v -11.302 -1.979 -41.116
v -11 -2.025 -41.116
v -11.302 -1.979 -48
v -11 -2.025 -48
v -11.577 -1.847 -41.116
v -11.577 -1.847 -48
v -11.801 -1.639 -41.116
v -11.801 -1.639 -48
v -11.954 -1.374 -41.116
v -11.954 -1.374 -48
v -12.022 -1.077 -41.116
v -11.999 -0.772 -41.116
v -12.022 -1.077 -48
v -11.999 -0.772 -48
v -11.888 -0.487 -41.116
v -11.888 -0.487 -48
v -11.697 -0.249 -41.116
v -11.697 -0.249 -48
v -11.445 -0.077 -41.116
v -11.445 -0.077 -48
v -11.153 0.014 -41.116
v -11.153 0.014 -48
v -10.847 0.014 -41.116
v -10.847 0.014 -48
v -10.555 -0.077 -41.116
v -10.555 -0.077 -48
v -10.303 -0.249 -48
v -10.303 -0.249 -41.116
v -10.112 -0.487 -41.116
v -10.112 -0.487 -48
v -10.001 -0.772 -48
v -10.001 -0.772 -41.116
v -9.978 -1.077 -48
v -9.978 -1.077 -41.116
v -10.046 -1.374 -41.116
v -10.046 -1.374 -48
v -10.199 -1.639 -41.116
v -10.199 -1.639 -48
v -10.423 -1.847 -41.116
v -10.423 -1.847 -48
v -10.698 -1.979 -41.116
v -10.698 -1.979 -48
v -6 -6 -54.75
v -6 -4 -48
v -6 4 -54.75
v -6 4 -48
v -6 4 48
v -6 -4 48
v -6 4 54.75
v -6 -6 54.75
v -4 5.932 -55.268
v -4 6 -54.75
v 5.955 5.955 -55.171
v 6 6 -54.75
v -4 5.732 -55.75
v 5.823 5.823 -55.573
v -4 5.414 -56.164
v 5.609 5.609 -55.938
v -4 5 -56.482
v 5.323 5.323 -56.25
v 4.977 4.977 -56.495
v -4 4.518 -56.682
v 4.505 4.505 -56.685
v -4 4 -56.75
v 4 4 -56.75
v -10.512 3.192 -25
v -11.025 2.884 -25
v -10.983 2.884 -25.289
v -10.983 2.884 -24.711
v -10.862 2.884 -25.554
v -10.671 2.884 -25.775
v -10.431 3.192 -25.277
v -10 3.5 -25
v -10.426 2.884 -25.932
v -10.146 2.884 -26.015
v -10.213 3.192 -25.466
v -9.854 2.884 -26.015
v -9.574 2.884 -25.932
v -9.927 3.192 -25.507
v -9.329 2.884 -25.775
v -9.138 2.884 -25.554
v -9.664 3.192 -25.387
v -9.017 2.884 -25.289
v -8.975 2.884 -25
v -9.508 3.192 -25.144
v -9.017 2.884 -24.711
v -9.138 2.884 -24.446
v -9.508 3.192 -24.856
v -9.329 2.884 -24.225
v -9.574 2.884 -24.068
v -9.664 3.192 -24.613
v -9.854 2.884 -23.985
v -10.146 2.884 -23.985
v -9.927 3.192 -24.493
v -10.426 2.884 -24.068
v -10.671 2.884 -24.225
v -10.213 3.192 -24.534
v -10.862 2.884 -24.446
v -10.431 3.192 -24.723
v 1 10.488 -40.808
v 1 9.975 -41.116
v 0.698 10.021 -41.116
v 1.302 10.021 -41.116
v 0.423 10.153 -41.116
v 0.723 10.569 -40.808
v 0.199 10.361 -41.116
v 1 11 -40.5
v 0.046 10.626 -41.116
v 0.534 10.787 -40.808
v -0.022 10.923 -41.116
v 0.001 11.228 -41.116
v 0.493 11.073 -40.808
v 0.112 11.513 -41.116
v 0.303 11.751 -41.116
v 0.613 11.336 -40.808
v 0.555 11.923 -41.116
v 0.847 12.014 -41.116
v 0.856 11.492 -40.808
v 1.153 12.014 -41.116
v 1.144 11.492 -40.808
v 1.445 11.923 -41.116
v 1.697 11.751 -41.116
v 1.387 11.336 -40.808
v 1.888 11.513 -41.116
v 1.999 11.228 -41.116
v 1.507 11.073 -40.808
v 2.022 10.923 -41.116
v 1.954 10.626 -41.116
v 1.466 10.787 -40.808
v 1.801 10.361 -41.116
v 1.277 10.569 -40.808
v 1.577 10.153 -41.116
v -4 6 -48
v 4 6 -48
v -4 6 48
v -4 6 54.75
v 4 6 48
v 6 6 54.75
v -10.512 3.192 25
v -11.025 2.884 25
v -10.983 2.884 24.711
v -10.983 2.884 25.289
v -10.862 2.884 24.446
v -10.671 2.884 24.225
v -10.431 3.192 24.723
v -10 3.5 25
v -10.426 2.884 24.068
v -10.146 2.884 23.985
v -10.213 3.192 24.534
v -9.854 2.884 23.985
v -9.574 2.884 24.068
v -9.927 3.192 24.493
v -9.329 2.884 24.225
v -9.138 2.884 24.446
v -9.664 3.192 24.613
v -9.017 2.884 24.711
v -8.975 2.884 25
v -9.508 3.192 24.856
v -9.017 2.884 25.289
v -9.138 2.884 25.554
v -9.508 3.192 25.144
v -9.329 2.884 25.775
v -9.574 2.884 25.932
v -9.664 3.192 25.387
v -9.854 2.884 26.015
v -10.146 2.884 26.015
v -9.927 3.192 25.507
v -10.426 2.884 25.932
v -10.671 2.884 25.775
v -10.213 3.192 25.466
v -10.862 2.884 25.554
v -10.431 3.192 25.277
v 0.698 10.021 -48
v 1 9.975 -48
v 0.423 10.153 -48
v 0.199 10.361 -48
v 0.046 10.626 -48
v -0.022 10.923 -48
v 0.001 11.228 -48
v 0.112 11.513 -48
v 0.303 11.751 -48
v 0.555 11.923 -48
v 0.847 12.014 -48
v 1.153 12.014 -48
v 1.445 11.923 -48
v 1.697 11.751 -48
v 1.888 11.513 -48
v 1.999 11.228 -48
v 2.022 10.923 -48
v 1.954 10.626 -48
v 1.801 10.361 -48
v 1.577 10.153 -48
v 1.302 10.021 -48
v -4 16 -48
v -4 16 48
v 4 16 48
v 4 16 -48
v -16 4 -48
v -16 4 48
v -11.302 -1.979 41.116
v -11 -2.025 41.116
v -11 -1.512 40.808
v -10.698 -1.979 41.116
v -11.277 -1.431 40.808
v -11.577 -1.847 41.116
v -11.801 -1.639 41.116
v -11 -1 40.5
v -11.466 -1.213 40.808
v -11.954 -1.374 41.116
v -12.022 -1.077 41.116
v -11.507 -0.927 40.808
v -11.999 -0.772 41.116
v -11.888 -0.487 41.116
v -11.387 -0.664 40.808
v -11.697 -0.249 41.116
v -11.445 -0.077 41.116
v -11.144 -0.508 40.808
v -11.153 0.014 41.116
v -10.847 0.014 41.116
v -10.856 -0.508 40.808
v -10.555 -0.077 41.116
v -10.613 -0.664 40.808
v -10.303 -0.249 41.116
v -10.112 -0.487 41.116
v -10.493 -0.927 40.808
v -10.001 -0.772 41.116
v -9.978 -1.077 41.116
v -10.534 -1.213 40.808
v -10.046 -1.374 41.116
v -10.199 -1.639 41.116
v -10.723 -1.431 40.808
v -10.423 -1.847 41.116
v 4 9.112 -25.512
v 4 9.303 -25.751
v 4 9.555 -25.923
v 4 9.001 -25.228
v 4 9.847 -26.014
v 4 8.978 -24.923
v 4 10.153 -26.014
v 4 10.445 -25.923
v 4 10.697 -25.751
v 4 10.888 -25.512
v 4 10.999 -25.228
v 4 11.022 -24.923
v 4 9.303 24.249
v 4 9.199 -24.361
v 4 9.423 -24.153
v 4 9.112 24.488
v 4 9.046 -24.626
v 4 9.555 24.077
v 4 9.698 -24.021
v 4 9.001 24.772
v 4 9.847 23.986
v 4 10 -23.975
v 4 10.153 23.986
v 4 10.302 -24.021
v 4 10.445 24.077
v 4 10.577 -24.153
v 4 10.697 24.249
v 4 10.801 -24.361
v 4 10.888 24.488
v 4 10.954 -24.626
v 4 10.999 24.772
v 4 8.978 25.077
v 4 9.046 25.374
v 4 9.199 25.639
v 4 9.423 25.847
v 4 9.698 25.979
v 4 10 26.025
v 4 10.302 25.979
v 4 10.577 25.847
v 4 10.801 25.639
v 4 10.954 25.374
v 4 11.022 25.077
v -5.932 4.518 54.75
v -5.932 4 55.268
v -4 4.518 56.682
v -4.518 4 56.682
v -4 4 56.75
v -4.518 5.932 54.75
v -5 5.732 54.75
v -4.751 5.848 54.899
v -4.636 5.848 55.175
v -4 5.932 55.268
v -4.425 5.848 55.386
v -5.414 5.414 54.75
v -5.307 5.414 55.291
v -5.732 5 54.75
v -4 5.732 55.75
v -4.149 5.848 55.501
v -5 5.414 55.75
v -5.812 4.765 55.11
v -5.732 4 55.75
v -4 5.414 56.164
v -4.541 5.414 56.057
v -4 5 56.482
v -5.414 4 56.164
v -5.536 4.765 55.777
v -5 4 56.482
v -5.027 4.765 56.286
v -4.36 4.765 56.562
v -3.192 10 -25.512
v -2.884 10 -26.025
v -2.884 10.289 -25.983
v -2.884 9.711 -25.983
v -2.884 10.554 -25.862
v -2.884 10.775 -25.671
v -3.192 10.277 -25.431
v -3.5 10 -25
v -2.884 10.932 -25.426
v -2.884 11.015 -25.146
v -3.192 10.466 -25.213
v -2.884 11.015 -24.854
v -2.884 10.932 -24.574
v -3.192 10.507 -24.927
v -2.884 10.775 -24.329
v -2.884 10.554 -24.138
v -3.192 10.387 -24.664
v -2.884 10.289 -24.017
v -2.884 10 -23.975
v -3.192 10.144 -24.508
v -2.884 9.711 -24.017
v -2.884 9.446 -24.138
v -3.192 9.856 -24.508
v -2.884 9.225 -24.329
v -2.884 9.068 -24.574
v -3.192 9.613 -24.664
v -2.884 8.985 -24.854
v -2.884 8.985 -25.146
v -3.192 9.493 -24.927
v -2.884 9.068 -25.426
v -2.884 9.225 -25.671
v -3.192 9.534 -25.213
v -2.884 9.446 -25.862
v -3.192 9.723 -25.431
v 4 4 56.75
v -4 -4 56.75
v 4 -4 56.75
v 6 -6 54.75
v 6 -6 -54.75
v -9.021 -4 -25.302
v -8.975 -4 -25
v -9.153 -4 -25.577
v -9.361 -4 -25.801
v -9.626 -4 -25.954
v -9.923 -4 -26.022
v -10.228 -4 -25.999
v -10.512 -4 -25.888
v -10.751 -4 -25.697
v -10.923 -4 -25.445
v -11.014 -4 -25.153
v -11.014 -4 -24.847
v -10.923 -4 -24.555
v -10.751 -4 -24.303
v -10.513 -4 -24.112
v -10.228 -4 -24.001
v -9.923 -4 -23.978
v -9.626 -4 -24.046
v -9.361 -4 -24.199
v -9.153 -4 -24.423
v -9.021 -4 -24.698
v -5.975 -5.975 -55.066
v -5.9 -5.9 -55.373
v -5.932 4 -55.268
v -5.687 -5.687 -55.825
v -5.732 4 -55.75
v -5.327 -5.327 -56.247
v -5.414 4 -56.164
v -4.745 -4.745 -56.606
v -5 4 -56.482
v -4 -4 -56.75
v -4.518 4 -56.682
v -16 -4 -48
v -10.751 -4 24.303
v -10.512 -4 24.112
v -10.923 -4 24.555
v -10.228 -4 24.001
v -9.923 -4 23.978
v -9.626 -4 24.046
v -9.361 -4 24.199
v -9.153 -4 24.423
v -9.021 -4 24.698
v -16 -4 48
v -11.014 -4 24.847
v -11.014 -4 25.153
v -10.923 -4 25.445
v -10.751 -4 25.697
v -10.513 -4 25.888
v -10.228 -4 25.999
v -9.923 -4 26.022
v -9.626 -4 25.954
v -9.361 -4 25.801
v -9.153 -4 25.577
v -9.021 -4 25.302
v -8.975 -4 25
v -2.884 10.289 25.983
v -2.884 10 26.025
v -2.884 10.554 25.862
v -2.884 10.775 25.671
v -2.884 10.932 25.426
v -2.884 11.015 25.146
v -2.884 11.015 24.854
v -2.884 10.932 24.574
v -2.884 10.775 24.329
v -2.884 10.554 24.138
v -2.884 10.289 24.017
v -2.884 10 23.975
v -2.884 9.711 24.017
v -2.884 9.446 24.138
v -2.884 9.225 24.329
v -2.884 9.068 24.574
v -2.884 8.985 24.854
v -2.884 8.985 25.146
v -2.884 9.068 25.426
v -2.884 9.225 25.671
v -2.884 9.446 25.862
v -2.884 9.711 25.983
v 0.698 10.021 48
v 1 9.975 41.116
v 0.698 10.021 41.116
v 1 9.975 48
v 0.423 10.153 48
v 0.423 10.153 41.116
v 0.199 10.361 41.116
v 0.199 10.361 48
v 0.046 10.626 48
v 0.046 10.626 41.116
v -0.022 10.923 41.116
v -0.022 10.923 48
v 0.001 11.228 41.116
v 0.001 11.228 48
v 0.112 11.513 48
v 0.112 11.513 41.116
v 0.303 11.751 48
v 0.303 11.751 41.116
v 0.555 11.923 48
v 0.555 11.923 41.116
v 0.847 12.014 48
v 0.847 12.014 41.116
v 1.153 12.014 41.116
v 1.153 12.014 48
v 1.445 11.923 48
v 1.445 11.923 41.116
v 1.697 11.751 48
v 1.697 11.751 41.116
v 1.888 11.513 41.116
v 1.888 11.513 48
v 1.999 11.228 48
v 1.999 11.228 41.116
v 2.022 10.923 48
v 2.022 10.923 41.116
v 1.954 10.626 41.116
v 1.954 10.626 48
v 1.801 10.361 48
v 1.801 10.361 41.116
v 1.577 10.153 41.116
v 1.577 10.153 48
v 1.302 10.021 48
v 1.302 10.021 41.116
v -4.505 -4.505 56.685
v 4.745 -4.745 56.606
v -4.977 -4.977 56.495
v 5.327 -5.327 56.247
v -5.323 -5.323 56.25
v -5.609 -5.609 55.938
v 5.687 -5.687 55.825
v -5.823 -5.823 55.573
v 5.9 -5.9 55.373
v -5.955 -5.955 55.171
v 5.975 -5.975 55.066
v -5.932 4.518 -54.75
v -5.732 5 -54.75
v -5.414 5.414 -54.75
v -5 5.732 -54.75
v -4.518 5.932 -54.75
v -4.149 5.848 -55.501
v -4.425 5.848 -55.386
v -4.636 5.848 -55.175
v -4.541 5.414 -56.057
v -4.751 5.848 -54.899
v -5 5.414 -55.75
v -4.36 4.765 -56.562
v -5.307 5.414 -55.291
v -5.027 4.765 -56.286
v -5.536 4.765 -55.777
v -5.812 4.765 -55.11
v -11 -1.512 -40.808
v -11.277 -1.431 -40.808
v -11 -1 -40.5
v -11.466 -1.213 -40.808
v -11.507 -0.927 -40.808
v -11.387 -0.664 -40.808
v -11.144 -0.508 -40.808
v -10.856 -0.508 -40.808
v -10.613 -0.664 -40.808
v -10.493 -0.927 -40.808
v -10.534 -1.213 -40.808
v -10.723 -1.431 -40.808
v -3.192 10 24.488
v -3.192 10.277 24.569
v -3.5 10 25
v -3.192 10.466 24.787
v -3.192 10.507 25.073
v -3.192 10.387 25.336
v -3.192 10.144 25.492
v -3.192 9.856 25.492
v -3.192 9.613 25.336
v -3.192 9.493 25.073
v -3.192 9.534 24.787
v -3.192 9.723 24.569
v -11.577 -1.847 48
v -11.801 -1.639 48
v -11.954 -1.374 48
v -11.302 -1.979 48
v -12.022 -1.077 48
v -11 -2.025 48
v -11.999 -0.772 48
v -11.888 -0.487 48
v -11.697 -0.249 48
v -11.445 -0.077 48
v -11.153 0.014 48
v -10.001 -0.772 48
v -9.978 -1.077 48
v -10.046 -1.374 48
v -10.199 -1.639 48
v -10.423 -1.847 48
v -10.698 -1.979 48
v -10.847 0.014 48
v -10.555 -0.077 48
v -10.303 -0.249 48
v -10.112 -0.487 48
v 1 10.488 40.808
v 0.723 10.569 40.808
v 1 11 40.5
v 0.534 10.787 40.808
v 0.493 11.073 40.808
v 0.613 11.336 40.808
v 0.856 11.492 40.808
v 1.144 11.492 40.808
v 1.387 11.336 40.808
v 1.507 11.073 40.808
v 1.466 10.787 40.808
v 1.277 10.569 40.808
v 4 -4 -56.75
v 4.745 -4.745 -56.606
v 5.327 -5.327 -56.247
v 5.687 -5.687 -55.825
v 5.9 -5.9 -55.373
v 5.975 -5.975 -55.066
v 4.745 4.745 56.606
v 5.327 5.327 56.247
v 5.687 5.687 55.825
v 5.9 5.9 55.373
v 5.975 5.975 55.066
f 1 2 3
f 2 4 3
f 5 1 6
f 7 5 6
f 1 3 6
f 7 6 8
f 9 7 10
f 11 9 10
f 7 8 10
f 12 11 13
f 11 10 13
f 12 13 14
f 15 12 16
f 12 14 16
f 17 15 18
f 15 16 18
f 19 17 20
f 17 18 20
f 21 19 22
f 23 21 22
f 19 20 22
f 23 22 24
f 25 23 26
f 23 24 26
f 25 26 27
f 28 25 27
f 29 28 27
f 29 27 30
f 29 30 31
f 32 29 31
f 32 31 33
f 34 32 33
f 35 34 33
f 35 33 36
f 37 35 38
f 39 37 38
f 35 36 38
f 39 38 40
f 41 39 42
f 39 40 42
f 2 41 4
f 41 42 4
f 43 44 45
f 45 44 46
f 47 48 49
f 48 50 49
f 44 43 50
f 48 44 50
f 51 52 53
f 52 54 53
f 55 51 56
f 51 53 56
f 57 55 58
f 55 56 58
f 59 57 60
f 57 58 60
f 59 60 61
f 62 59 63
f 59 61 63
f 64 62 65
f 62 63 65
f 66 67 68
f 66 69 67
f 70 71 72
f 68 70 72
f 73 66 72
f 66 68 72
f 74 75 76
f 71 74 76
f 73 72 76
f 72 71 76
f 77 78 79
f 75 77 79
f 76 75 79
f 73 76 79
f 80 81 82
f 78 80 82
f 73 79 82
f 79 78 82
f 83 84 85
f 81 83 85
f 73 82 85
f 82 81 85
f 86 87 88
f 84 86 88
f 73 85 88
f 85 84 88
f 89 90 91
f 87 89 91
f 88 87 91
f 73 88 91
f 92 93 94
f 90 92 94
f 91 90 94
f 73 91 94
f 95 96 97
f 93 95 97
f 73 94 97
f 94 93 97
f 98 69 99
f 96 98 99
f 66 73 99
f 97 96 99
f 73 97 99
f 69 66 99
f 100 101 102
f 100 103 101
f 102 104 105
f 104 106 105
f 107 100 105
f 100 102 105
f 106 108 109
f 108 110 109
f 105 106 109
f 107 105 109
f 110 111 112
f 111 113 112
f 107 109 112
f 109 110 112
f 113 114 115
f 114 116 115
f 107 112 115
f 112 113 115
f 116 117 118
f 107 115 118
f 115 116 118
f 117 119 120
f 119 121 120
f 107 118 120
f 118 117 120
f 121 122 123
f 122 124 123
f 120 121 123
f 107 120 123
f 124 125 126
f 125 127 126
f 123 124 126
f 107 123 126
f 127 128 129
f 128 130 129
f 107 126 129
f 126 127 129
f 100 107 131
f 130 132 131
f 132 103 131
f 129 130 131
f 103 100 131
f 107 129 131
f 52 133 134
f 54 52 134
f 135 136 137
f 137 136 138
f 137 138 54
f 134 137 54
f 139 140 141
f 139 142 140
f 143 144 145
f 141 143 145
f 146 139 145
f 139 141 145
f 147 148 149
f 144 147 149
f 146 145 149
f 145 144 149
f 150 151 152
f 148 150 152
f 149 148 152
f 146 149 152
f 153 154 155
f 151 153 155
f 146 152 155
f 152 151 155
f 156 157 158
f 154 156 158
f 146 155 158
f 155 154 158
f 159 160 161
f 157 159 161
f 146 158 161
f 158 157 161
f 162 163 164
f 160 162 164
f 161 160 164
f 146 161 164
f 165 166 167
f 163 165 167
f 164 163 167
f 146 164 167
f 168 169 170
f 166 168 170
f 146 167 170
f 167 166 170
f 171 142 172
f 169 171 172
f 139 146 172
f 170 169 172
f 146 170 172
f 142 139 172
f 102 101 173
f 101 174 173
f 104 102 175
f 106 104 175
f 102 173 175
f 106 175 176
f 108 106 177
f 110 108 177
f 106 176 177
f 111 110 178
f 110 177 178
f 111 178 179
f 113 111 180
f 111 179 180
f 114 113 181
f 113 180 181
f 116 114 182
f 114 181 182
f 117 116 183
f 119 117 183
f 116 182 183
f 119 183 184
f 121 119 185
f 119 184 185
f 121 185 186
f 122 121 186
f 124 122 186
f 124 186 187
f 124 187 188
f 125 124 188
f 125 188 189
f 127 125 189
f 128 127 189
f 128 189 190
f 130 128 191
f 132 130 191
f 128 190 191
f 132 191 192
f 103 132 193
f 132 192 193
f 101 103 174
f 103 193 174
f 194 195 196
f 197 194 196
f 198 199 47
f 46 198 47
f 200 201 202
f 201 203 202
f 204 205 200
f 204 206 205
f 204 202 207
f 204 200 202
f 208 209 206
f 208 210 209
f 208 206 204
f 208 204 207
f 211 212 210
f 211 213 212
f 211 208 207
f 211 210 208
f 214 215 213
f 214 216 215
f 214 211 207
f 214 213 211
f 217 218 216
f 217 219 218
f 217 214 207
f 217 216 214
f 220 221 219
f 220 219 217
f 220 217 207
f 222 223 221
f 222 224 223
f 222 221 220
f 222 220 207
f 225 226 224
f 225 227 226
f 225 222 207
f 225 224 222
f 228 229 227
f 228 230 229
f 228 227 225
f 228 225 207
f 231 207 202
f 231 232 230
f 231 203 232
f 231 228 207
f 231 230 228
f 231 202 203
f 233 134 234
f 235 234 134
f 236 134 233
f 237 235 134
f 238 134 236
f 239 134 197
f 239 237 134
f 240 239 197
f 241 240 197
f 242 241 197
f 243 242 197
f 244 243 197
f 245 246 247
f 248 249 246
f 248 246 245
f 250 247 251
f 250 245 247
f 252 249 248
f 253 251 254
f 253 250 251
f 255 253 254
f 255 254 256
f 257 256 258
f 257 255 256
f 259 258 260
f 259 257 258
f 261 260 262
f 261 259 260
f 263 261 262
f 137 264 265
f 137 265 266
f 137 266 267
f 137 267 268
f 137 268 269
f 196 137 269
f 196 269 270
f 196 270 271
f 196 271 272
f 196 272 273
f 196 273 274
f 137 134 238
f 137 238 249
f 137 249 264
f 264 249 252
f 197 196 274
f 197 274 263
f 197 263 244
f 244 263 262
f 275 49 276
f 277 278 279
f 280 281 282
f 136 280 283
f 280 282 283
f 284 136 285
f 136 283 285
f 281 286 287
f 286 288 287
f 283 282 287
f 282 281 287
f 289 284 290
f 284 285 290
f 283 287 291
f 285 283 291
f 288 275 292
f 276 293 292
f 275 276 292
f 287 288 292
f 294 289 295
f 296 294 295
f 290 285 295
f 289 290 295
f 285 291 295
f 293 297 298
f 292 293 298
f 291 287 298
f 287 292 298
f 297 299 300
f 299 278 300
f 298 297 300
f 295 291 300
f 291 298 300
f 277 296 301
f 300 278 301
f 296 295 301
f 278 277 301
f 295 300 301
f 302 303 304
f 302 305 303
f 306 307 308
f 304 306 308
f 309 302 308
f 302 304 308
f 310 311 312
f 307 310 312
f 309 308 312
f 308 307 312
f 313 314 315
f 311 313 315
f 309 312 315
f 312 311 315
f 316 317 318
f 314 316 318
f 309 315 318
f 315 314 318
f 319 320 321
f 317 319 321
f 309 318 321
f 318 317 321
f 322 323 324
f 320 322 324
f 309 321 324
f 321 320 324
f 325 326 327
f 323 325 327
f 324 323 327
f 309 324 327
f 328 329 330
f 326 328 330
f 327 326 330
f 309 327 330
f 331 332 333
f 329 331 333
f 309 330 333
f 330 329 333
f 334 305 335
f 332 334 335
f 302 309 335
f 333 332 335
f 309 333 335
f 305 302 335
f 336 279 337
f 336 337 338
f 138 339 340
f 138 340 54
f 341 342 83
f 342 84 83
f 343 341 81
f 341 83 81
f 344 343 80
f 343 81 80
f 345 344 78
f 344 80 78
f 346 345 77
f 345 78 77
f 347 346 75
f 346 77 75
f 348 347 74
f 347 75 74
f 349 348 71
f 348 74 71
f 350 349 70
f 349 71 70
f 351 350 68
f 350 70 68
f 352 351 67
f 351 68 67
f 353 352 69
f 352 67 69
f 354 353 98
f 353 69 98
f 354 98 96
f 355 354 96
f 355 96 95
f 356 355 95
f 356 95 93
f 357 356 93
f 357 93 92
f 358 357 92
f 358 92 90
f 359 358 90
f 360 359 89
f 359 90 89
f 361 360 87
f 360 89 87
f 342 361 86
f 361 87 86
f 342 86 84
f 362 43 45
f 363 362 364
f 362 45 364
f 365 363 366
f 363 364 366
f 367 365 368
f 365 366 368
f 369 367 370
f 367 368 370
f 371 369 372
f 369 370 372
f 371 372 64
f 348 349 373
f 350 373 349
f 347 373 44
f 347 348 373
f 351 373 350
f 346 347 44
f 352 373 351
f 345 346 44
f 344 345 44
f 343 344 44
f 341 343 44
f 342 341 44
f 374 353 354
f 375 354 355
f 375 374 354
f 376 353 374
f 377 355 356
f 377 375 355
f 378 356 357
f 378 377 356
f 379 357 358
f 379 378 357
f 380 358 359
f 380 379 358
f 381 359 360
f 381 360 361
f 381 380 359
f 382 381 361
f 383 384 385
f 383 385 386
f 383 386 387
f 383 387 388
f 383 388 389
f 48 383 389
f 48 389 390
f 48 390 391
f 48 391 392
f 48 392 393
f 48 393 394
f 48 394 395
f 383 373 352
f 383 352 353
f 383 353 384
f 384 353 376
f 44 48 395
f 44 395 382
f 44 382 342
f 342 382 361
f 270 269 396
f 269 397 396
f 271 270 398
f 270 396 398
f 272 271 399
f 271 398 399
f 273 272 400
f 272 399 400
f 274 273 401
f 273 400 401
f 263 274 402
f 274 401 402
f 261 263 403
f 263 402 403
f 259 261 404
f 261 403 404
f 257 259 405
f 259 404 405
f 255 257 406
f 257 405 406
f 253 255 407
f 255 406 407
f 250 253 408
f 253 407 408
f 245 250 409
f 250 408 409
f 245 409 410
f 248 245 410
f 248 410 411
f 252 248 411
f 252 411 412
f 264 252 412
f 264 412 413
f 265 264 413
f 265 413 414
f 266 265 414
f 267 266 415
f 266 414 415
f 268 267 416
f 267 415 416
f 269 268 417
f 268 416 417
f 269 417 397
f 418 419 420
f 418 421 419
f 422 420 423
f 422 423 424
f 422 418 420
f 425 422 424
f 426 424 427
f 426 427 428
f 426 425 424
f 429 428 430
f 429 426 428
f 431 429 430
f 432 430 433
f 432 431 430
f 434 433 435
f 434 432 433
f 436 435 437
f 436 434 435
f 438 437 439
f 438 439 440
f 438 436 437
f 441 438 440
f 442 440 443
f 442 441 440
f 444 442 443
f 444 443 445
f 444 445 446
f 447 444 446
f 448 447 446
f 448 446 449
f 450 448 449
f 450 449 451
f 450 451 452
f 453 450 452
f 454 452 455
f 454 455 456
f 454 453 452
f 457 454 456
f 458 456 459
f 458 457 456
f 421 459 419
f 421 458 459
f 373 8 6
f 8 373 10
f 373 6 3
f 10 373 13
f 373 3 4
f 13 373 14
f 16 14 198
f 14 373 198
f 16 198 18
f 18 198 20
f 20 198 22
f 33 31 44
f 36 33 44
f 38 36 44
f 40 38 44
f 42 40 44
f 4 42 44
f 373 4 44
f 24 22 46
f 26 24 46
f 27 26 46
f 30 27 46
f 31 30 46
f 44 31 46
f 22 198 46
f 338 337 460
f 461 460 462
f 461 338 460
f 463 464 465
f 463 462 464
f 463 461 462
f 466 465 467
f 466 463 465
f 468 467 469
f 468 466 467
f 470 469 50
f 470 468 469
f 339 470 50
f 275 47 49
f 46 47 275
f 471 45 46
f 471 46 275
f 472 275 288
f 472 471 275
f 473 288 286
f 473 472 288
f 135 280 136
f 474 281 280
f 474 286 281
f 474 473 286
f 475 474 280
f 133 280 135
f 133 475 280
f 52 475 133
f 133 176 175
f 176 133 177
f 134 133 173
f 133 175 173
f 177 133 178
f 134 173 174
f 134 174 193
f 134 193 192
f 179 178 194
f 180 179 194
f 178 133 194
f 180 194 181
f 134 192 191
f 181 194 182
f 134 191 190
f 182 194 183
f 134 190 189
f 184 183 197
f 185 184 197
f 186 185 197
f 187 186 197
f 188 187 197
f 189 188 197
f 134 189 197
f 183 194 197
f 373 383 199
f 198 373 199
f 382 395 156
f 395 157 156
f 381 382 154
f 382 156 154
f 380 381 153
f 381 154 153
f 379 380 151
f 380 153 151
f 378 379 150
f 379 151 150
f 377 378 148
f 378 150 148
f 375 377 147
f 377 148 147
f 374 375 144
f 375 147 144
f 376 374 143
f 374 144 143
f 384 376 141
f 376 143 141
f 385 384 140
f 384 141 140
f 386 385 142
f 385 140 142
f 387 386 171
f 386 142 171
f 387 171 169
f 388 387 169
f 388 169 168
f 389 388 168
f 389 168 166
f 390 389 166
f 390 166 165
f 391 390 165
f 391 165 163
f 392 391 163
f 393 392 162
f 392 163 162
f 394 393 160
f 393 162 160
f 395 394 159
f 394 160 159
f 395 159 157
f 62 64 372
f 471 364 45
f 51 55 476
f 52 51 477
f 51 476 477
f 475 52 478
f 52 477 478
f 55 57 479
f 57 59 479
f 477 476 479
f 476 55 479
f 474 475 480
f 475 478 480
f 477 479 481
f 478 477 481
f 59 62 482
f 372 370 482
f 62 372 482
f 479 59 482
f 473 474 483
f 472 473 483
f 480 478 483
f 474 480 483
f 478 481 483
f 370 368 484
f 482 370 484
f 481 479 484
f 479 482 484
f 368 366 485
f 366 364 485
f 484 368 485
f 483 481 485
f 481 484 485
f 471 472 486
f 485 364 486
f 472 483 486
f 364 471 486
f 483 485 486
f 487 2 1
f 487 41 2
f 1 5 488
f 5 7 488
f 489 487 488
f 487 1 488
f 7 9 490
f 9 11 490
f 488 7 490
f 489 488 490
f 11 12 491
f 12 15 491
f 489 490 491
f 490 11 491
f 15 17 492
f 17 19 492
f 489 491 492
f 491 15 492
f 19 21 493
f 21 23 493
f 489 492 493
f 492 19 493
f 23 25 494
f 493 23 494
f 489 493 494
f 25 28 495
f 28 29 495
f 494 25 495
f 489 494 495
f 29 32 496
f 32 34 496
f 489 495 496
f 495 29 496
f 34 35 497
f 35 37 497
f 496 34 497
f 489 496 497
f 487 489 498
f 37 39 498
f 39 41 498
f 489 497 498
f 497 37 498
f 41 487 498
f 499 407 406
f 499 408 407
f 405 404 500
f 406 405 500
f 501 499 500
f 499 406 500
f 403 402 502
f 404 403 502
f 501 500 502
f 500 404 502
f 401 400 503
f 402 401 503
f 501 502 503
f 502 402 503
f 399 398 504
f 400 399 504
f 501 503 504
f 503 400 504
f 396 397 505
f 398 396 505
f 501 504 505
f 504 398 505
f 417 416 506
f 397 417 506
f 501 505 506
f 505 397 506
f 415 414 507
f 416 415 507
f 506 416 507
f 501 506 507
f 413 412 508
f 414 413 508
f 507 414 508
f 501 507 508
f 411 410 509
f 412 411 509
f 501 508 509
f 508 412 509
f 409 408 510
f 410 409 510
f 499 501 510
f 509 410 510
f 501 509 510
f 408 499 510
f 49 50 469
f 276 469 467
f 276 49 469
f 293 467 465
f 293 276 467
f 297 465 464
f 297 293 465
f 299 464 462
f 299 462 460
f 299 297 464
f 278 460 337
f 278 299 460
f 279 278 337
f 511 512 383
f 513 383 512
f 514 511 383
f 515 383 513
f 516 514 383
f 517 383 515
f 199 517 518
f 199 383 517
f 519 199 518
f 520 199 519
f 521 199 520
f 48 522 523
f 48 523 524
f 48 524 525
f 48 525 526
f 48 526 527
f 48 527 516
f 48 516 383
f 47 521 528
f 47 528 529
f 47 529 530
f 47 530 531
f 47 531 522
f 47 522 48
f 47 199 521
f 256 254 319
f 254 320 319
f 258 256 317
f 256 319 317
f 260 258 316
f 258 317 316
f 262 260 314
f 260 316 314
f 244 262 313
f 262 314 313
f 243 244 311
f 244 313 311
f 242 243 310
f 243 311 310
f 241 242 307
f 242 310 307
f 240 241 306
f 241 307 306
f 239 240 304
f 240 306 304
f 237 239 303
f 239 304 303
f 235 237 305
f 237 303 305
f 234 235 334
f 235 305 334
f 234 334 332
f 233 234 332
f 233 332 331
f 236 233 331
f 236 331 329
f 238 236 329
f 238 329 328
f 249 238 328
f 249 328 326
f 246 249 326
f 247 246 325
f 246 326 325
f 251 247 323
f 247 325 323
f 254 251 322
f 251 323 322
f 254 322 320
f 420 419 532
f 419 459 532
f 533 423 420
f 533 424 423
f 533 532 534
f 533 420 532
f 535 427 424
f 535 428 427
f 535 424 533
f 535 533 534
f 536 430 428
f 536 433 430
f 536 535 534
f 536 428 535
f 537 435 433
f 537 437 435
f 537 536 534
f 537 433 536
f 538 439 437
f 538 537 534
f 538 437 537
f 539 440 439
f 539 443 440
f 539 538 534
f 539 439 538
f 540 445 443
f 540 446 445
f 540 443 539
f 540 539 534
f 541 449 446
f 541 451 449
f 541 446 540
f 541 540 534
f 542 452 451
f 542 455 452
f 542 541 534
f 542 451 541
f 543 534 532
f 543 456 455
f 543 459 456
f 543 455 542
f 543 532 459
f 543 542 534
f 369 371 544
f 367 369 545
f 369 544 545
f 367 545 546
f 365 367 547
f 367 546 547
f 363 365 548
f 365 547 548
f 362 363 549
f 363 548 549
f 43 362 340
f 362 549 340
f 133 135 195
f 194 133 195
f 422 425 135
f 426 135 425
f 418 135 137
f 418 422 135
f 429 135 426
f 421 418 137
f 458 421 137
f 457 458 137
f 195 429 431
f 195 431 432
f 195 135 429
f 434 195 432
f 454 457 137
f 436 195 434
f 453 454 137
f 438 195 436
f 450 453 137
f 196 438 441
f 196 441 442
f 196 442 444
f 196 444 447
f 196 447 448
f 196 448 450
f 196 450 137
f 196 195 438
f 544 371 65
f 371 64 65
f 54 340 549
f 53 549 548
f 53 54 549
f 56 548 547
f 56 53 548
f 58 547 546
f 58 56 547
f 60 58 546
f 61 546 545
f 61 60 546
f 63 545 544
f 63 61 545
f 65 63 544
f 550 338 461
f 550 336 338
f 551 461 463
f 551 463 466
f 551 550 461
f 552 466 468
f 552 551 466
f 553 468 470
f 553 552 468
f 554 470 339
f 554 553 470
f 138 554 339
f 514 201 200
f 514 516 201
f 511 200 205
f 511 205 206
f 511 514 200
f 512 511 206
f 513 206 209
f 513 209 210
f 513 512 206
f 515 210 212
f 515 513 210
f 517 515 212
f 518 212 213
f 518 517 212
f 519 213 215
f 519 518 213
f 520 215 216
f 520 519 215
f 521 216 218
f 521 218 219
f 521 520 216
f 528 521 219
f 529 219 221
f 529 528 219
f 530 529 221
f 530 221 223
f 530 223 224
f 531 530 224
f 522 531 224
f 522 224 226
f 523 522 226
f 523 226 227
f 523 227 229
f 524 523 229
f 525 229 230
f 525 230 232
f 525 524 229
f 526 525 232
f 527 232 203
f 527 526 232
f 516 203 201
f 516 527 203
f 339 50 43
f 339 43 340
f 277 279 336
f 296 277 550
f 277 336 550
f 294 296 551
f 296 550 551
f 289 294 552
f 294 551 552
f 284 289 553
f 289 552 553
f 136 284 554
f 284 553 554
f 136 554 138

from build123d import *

# Parameters (mm, degrees)
SCHIZZO1_W                   = 12
SCHIZZO1_H                   = 12
ESTRUSIONE_ESTRUSIONE1_DEPTH = 56.75
RACCORDO1_R                  = 2
ESTRUSIONE_ESTRUSIONE3_START = -8.75
SCHIZZO3_W                   = 8
SCHIZZO3_H                   = 10
SCHIZZO3_W_2                 = 10
SCHIZZO3_H_2                 = 8
ESTRUSIONE_ESTRUSIONE3_DEPTH = 96
FORO_FILETTATO_M2_5_3_D      = 2.05
FORO_FILETTATO_M2_5_3_DEPTH  = 6.884117865
FORO_FILETTATO_M2_5_3_TIP    = 0.615882135
FORO_FILETTATO_M2_5_4_D      = 2.05
FORO_FILETTATO_M2_5_4_DEPTH  = 6.884117865
FORO_FILETTATO_M2_5_4_TIP    = 0.615882135


with BuildPart() as part:
    # Schizzo1 → Estrusione-Estrusione1 (new, symmetric)
    with BuildSketch(Plane.XY):
        Rectangle(SCHIZZO1_W, SCHIZZO1_H)
    extrude(amount=ESTRUSIONE_ESTRUSIONE1_DEPTH, both=True)

    # Raccordo1
    raccordo1_edges = [part.edges().sort_by_distance(p)[0] for p in [
        (-6, 0, 56.75),
        (0, -6, 56.75),
        (6, 0, 56.75),
        (0, -6, -56.75),
        (-6, 0, -56.75),
        (0, 6, -56.75),
        (6, 0, -56.75),
        (-6, 6, 0),
        (0, 6, 56.75),
    ]]
    fillet(raccordo1_edges, radius=RACCORDO1_R)

    # Schizzo3 → Estrusione-Estrusione3 (add)
    with BuildSketch(Plane.XY.offset(56.75).offset(ESTRUSIONE_ESTRUSIONE3_START)):
        with Locations((0, 11)):
            Rectangle(SCHIZZO3_W, SCHIZZO3_H)
        with Locations((-11, 0)):
            Rectangle(SCHIZZO3_W_2, SCHIZZO3_H_2)
    extrude(amount=-ESTRUSIONE_ESTRUSIONE3_DEPTH)

    # Schizzo5 → Foro filettato M2.5-1 (revolve, cut)
    with BuildSketch(Plane(origin=(1, 11, 48), x_dir=(0, -1, 0), z_dir=(1, 0, 0))):
        Polygon((0, 0), (0, 7.5), (1.025, 6.884117865), (1.025, 0), align=None)
    foro_filettato_m2_5_1 = revolve(axis=Axis((1, 11, 54.35), (0, 0, -1)), mode=Mode.SUBTRACT)

    # Schizzo8 → Foro filettato M2.5-2 (revolve, cut)
    with BuildSketch(Plane(origin=(-11, -1, 48), x_dir=(0, -1, 0), z_dir=(1, 0, 0))):
        Polygon((0, 0), (0, 7.5), (1.025, 6.884117865), (1.025, 0), align=None)
    foro_filettato_m2_5_2 = revolve(axis=Axis((-11, -1, 54.35), (0, 0, -1)), mode=Mode.SUBTRACT)

    # Specchia2: Foro filettato M2.5-1, Foro filettato M2.5-2 across plane
    add(foro_filettato_m2_5_1.mirror(Plane.XY), mode=Mode.SUBTRACT)
    add(foro_filettato_m2_5_2.mirror(Plane.XY), mode=Mode.SUBTRACT)

    # Foro filettato M2.5-3
    with Locations(Plane(origin=(4, 0, 0), x_dir=(0, 0, -1), z_dir=(1, 0, 0))):
        with Locations((-25, 10), (25, 10)):
            Hole(FORO_FILETTATO_M2_5_3_D / 2, depth=FORO_FILETTATO_M2_5_3_DEPTH)
            with Locations((0, 0, -(FORO_FILETTATO_M2_5_3_DEPTH + FORO_FILETTATO_M2_5_3_TIP / 2))):  # 118° drill point
                Cone(0, FORO_FILETTATO_M2_5_3_D / 2, FORO_FILETTATO_M2_5_3_TIP, mode=Mode.SUBTRACT)

    # Foro filettato M2.5-4
    with Locations(Plane(origin=(0, -4, 0), x_dir=(-1, 0, 0), z_dir=(0, -1, 0))):
        with Locations((10, 25), (10, -25)):
            Hole(FORO_FILETTATO_M2_5_4_D / 2, depth=FORO_FILETTATO_M2_5_4_DEPTH)
            with Locations((0, 0, -(FORO_FILETTATO_M2_5_4_DEPTH + FORO_FILETTATO_M2_5_4_TIP / 2))):  # 118° drill point
                Cone(0, FORO_FILETTATO_M2_5_4_D / 2, FORO_FILETTATO_M2_5_4_TIP, mode=Mode.SUBTRACT)


solid = part.part
